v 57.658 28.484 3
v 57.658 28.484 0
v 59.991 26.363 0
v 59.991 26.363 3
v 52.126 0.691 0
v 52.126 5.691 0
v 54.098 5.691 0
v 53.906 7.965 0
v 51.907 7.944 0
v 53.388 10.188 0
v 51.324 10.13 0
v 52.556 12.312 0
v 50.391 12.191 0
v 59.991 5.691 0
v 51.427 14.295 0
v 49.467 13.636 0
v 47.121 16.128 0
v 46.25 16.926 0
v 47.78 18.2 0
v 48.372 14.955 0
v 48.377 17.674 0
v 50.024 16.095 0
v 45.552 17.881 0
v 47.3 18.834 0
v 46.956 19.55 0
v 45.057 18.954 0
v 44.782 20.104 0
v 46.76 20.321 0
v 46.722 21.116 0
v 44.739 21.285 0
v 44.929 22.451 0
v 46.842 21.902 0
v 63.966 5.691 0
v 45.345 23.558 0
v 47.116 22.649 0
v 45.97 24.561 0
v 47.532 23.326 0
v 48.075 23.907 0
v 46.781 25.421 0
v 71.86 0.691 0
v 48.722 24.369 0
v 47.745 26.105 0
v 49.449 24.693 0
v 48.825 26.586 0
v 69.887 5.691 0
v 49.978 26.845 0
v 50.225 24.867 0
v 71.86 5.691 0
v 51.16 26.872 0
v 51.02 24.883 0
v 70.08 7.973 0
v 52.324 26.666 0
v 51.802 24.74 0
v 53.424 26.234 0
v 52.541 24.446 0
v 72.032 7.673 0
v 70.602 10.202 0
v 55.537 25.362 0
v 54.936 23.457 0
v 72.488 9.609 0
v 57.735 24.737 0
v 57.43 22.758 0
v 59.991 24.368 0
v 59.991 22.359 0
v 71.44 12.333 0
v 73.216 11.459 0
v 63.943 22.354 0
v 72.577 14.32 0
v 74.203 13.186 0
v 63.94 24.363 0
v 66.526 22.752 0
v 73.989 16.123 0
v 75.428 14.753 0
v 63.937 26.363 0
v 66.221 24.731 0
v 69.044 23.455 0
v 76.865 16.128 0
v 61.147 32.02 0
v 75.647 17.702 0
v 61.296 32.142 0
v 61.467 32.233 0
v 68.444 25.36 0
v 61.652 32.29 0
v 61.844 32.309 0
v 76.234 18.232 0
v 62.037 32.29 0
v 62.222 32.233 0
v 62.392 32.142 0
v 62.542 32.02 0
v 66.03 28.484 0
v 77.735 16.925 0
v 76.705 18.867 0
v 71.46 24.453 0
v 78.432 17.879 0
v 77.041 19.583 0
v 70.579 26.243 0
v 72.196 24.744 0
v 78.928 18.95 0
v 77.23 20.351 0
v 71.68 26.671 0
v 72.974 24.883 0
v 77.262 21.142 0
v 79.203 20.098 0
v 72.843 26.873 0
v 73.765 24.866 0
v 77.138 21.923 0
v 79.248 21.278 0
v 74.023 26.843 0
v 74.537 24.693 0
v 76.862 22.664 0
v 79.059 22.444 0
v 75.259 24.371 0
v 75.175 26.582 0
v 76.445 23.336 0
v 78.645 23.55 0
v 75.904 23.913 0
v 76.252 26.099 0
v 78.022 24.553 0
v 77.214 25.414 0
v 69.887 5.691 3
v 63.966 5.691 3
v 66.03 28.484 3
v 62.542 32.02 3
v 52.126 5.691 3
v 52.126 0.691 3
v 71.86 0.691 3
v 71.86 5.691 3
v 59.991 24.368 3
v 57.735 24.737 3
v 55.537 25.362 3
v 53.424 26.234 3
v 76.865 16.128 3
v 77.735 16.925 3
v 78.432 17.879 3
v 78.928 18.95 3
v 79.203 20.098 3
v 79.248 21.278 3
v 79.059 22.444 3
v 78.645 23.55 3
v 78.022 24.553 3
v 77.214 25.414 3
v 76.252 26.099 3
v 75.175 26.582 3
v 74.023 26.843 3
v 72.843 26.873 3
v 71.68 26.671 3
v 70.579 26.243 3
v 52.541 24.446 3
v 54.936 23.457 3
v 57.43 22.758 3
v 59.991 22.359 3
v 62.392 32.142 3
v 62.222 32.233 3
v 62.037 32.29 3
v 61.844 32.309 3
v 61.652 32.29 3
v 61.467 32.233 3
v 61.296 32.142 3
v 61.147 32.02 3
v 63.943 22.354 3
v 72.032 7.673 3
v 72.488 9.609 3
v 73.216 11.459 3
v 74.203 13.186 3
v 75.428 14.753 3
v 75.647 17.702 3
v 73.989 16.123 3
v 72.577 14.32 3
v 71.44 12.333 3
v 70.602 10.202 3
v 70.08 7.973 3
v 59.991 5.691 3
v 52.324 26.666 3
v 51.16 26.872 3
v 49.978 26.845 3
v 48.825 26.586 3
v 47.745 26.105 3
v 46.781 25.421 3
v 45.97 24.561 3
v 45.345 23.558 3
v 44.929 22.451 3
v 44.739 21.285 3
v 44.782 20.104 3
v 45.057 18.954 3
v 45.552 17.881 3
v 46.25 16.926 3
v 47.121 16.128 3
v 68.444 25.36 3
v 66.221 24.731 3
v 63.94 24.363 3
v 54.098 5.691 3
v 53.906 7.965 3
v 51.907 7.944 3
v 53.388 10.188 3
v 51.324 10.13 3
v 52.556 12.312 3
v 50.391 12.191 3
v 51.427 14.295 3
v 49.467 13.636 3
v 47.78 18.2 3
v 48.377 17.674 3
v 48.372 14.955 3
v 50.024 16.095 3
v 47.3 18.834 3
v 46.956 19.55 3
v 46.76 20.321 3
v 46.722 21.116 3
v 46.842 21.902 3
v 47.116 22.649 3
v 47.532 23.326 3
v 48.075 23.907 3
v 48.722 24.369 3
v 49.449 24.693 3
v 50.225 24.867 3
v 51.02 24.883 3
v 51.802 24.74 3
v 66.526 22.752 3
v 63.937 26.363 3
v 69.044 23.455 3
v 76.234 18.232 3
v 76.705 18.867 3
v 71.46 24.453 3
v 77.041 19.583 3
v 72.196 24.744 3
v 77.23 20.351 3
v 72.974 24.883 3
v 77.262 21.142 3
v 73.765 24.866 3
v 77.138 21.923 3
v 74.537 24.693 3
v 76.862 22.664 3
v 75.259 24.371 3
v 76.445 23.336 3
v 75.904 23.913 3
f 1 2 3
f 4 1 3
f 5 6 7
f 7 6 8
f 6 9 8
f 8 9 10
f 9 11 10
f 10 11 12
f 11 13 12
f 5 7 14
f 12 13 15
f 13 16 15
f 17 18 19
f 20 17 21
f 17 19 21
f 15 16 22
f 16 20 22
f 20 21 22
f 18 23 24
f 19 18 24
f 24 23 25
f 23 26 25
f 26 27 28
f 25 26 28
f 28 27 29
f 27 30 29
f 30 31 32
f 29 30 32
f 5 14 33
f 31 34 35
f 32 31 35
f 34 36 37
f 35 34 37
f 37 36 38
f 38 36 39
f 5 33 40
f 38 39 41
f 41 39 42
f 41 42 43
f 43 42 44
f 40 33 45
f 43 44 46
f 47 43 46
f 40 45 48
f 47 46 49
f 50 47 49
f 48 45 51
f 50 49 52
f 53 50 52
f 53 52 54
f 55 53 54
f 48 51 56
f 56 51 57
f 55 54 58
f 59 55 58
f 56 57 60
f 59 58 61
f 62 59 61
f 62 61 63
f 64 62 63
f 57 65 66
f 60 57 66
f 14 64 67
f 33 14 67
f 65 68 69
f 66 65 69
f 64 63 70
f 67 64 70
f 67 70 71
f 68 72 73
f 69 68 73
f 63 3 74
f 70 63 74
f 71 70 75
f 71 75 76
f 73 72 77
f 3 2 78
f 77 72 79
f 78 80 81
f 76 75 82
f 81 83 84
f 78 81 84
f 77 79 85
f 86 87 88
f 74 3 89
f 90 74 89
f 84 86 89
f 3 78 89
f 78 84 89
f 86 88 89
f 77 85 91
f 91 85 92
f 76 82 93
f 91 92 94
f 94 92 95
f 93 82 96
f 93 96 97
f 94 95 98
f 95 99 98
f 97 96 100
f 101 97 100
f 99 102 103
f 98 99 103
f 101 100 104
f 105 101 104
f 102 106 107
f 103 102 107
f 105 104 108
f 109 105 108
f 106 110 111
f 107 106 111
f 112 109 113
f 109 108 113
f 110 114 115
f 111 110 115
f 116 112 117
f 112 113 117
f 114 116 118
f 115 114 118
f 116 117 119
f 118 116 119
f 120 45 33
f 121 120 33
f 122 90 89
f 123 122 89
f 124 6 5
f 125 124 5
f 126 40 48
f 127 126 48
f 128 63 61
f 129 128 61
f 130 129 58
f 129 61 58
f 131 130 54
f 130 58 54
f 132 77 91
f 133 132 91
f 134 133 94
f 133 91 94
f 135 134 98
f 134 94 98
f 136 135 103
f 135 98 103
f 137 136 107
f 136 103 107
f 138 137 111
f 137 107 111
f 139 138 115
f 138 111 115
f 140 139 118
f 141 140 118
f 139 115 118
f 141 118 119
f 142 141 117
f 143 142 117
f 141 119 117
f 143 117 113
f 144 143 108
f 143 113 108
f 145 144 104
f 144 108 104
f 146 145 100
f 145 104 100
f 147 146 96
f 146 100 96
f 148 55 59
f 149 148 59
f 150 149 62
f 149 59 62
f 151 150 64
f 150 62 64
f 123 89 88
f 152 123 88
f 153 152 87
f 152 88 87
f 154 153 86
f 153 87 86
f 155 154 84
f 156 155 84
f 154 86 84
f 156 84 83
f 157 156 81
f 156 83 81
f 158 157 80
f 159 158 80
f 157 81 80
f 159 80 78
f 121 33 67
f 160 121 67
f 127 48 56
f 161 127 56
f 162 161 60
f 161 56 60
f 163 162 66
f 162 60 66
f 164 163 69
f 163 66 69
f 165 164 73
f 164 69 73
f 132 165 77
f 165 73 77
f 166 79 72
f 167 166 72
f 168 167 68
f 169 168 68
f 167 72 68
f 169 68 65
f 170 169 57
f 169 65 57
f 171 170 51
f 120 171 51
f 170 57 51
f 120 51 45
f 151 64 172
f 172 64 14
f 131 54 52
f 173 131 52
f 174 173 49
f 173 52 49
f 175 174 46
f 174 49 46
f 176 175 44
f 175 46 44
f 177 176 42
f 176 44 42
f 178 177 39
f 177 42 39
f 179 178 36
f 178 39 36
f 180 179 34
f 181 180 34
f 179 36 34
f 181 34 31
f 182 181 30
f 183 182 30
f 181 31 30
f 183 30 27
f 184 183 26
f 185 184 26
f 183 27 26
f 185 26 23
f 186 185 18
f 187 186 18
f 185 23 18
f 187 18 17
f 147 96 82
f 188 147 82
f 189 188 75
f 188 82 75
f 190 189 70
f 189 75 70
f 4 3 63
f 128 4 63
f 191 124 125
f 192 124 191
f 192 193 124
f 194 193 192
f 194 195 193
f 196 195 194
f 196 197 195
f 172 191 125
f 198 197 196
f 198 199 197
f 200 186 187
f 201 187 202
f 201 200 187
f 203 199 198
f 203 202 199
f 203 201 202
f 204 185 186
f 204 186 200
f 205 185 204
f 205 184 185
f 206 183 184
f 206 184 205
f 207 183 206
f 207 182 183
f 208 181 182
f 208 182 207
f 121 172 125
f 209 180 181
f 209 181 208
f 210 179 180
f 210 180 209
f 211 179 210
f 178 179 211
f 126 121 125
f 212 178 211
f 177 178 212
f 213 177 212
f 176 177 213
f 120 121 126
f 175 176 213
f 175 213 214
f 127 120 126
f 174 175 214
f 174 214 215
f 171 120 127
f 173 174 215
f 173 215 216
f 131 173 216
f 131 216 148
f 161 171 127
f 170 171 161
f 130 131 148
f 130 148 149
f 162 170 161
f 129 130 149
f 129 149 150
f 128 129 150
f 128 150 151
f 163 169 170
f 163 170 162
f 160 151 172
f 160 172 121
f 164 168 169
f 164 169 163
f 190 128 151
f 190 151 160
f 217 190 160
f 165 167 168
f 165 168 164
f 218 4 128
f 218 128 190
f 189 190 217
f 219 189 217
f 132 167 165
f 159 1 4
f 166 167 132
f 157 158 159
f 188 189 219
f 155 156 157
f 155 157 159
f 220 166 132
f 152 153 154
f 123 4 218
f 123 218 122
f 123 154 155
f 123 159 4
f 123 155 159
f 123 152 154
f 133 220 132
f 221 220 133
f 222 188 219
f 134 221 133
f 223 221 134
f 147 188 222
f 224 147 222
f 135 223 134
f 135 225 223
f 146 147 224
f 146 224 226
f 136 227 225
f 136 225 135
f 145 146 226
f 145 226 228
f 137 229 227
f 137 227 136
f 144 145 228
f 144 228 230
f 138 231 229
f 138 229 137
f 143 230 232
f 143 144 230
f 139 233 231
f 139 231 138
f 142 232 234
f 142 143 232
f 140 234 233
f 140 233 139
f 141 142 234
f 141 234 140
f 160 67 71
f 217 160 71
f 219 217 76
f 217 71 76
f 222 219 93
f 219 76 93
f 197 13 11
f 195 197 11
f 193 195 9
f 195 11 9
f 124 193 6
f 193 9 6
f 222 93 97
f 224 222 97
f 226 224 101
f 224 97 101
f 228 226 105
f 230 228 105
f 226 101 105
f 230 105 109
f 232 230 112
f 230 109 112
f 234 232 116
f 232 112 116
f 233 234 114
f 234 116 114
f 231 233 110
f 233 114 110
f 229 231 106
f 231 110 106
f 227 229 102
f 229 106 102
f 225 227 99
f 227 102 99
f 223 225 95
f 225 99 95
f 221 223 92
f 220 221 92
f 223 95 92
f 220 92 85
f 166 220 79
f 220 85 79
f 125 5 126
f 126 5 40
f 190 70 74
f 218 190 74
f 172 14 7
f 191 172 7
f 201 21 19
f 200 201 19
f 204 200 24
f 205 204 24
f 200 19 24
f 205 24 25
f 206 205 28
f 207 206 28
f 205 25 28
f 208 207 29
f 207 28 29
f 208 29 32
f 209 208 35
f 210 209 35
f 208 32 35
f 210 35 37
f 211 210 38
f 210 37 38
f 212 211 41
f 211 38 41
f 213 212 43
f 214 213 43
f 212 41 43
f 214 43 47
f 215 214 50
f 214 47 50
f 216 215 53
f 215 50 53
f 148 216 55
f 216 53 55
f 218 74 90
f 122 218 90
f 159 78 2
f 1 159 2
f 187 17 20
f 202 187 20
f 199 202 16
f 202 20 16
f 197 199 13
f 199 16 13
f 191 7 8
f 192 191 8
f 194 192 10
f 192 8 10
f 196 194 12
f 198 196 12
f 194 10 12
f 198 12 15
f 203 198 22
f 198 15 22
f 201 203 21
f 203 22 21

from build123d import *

# Parameters (mm, degrees)
SALIENTE_EXTRUIR1_DEPTH = 3


with BuildPart() as part:
    # Model → Saliente-Extruir1 (new body)
    with BuildSketch(Plane.XY):
        with BuildLine():
            Line((52.126339564, 0.69142602), (71.859672897, 0.69142602))
            Line((71.859672897, 0.69142602), (71.859672897, 5.69142602))
            ThreePointArc((71.859672897, 5.69142602), (73.216437638, 11.459046612), (76.864886687, 16.127566441))
            ThreePointArc((76.864886687, 16.127566441), (78.358673415, 24.066839848), (70.578789676, 26.243275014))
            ThreePointArc((70.578789676, 26.243275014), (67.341569383, 25.013085855), (63.940045397, 24.363012656))
            Line((63.940045397, 24.363012656), (63.937229303, 26.362731754))
            Line((63.937229303, 26.362731754), (66.030265375, 28.484052098))
            Line((66.030265375, 28.484052098), (62.541871922, 32.019586004))
            ThreePointArc((62.541871922, 32.019586004), (61.844193231, 32.30857398), (61.14651454, 32.019586004))
            Line((61.14651454, 32.019586004), (57.658121086, 28.484052098))
            Line((57.658121086, 28.484052098), (59.990562636, 26.362731754))
            Line((59.990562636, 26.362731754), (59.990562636, 24.368482398))
            ThreePointArc((59.990562636, 24.368482398), (56.626825565, 25.017616984), (53.424360475, 26.234301063))
            ThreePointArc((53.424360475, 26.234301063), (45.632437064, 24.074933253), (47.121132781, 16.127561055))
            ThreePointArc((47.121132781, 16.127561055), (48.940005662, 14.312179557), (50.391114233, 12.191285299))
            ThreePointArc((50.391114233, 12.191285299), (51.660499902, 9.048614396), (52.126339564, 5.69142602))
            Line((52.126339564, 5.69142602), (52.126339564, 0.69142602))
        make_face()
        with BuildLine():
            Line((59.990562636, 22.359186797), (59.990562636, 5.69142602))
            Line((59.990562636, 5.69142602), (54.098159046, 5.69142602))
            ThreePointArc((54.098159046, 5.69142602), (52.556239166, 12.312269616), (48.376647716, 17.673622257))
            ThreePointArc((48.376647716, 17.673622257), (47.306956592, 22.997651717), (52.54077152, 24.445653821))
            ThreePointArc((52.54077152, 24.445653821), (56.172655621, 23.070320202), (59.990562636, 22.359186797))
        make_face(mode=Mode.SUBTRACT)
        with BuildLine():
            Line((63.966339564, 5.69142602), (63.942873914, 22.354472252))
            ThreePointArc((63.942873914, 22.354472252), (67.795799116, 23.065868121), (71.459909133, 24.453461173))
            ThreePointArc((71.459909133, 24.453461173), (76.670564355, 23.010720068), (75.647074312, 17.701774987))
            ThreePointArc((75.647074312, 17.701774987), (71.439696493, 12.333149563), (69.886739491, 5.69142602))
            Line((69.886739491, 5.69142602), (63.966339564, 5.69142602))
        make_face(mode=Mode.SUBTRACT)
    extrude(amount=SALIENTE_EXTRUIR1_DEPTH)


solid = part.part
